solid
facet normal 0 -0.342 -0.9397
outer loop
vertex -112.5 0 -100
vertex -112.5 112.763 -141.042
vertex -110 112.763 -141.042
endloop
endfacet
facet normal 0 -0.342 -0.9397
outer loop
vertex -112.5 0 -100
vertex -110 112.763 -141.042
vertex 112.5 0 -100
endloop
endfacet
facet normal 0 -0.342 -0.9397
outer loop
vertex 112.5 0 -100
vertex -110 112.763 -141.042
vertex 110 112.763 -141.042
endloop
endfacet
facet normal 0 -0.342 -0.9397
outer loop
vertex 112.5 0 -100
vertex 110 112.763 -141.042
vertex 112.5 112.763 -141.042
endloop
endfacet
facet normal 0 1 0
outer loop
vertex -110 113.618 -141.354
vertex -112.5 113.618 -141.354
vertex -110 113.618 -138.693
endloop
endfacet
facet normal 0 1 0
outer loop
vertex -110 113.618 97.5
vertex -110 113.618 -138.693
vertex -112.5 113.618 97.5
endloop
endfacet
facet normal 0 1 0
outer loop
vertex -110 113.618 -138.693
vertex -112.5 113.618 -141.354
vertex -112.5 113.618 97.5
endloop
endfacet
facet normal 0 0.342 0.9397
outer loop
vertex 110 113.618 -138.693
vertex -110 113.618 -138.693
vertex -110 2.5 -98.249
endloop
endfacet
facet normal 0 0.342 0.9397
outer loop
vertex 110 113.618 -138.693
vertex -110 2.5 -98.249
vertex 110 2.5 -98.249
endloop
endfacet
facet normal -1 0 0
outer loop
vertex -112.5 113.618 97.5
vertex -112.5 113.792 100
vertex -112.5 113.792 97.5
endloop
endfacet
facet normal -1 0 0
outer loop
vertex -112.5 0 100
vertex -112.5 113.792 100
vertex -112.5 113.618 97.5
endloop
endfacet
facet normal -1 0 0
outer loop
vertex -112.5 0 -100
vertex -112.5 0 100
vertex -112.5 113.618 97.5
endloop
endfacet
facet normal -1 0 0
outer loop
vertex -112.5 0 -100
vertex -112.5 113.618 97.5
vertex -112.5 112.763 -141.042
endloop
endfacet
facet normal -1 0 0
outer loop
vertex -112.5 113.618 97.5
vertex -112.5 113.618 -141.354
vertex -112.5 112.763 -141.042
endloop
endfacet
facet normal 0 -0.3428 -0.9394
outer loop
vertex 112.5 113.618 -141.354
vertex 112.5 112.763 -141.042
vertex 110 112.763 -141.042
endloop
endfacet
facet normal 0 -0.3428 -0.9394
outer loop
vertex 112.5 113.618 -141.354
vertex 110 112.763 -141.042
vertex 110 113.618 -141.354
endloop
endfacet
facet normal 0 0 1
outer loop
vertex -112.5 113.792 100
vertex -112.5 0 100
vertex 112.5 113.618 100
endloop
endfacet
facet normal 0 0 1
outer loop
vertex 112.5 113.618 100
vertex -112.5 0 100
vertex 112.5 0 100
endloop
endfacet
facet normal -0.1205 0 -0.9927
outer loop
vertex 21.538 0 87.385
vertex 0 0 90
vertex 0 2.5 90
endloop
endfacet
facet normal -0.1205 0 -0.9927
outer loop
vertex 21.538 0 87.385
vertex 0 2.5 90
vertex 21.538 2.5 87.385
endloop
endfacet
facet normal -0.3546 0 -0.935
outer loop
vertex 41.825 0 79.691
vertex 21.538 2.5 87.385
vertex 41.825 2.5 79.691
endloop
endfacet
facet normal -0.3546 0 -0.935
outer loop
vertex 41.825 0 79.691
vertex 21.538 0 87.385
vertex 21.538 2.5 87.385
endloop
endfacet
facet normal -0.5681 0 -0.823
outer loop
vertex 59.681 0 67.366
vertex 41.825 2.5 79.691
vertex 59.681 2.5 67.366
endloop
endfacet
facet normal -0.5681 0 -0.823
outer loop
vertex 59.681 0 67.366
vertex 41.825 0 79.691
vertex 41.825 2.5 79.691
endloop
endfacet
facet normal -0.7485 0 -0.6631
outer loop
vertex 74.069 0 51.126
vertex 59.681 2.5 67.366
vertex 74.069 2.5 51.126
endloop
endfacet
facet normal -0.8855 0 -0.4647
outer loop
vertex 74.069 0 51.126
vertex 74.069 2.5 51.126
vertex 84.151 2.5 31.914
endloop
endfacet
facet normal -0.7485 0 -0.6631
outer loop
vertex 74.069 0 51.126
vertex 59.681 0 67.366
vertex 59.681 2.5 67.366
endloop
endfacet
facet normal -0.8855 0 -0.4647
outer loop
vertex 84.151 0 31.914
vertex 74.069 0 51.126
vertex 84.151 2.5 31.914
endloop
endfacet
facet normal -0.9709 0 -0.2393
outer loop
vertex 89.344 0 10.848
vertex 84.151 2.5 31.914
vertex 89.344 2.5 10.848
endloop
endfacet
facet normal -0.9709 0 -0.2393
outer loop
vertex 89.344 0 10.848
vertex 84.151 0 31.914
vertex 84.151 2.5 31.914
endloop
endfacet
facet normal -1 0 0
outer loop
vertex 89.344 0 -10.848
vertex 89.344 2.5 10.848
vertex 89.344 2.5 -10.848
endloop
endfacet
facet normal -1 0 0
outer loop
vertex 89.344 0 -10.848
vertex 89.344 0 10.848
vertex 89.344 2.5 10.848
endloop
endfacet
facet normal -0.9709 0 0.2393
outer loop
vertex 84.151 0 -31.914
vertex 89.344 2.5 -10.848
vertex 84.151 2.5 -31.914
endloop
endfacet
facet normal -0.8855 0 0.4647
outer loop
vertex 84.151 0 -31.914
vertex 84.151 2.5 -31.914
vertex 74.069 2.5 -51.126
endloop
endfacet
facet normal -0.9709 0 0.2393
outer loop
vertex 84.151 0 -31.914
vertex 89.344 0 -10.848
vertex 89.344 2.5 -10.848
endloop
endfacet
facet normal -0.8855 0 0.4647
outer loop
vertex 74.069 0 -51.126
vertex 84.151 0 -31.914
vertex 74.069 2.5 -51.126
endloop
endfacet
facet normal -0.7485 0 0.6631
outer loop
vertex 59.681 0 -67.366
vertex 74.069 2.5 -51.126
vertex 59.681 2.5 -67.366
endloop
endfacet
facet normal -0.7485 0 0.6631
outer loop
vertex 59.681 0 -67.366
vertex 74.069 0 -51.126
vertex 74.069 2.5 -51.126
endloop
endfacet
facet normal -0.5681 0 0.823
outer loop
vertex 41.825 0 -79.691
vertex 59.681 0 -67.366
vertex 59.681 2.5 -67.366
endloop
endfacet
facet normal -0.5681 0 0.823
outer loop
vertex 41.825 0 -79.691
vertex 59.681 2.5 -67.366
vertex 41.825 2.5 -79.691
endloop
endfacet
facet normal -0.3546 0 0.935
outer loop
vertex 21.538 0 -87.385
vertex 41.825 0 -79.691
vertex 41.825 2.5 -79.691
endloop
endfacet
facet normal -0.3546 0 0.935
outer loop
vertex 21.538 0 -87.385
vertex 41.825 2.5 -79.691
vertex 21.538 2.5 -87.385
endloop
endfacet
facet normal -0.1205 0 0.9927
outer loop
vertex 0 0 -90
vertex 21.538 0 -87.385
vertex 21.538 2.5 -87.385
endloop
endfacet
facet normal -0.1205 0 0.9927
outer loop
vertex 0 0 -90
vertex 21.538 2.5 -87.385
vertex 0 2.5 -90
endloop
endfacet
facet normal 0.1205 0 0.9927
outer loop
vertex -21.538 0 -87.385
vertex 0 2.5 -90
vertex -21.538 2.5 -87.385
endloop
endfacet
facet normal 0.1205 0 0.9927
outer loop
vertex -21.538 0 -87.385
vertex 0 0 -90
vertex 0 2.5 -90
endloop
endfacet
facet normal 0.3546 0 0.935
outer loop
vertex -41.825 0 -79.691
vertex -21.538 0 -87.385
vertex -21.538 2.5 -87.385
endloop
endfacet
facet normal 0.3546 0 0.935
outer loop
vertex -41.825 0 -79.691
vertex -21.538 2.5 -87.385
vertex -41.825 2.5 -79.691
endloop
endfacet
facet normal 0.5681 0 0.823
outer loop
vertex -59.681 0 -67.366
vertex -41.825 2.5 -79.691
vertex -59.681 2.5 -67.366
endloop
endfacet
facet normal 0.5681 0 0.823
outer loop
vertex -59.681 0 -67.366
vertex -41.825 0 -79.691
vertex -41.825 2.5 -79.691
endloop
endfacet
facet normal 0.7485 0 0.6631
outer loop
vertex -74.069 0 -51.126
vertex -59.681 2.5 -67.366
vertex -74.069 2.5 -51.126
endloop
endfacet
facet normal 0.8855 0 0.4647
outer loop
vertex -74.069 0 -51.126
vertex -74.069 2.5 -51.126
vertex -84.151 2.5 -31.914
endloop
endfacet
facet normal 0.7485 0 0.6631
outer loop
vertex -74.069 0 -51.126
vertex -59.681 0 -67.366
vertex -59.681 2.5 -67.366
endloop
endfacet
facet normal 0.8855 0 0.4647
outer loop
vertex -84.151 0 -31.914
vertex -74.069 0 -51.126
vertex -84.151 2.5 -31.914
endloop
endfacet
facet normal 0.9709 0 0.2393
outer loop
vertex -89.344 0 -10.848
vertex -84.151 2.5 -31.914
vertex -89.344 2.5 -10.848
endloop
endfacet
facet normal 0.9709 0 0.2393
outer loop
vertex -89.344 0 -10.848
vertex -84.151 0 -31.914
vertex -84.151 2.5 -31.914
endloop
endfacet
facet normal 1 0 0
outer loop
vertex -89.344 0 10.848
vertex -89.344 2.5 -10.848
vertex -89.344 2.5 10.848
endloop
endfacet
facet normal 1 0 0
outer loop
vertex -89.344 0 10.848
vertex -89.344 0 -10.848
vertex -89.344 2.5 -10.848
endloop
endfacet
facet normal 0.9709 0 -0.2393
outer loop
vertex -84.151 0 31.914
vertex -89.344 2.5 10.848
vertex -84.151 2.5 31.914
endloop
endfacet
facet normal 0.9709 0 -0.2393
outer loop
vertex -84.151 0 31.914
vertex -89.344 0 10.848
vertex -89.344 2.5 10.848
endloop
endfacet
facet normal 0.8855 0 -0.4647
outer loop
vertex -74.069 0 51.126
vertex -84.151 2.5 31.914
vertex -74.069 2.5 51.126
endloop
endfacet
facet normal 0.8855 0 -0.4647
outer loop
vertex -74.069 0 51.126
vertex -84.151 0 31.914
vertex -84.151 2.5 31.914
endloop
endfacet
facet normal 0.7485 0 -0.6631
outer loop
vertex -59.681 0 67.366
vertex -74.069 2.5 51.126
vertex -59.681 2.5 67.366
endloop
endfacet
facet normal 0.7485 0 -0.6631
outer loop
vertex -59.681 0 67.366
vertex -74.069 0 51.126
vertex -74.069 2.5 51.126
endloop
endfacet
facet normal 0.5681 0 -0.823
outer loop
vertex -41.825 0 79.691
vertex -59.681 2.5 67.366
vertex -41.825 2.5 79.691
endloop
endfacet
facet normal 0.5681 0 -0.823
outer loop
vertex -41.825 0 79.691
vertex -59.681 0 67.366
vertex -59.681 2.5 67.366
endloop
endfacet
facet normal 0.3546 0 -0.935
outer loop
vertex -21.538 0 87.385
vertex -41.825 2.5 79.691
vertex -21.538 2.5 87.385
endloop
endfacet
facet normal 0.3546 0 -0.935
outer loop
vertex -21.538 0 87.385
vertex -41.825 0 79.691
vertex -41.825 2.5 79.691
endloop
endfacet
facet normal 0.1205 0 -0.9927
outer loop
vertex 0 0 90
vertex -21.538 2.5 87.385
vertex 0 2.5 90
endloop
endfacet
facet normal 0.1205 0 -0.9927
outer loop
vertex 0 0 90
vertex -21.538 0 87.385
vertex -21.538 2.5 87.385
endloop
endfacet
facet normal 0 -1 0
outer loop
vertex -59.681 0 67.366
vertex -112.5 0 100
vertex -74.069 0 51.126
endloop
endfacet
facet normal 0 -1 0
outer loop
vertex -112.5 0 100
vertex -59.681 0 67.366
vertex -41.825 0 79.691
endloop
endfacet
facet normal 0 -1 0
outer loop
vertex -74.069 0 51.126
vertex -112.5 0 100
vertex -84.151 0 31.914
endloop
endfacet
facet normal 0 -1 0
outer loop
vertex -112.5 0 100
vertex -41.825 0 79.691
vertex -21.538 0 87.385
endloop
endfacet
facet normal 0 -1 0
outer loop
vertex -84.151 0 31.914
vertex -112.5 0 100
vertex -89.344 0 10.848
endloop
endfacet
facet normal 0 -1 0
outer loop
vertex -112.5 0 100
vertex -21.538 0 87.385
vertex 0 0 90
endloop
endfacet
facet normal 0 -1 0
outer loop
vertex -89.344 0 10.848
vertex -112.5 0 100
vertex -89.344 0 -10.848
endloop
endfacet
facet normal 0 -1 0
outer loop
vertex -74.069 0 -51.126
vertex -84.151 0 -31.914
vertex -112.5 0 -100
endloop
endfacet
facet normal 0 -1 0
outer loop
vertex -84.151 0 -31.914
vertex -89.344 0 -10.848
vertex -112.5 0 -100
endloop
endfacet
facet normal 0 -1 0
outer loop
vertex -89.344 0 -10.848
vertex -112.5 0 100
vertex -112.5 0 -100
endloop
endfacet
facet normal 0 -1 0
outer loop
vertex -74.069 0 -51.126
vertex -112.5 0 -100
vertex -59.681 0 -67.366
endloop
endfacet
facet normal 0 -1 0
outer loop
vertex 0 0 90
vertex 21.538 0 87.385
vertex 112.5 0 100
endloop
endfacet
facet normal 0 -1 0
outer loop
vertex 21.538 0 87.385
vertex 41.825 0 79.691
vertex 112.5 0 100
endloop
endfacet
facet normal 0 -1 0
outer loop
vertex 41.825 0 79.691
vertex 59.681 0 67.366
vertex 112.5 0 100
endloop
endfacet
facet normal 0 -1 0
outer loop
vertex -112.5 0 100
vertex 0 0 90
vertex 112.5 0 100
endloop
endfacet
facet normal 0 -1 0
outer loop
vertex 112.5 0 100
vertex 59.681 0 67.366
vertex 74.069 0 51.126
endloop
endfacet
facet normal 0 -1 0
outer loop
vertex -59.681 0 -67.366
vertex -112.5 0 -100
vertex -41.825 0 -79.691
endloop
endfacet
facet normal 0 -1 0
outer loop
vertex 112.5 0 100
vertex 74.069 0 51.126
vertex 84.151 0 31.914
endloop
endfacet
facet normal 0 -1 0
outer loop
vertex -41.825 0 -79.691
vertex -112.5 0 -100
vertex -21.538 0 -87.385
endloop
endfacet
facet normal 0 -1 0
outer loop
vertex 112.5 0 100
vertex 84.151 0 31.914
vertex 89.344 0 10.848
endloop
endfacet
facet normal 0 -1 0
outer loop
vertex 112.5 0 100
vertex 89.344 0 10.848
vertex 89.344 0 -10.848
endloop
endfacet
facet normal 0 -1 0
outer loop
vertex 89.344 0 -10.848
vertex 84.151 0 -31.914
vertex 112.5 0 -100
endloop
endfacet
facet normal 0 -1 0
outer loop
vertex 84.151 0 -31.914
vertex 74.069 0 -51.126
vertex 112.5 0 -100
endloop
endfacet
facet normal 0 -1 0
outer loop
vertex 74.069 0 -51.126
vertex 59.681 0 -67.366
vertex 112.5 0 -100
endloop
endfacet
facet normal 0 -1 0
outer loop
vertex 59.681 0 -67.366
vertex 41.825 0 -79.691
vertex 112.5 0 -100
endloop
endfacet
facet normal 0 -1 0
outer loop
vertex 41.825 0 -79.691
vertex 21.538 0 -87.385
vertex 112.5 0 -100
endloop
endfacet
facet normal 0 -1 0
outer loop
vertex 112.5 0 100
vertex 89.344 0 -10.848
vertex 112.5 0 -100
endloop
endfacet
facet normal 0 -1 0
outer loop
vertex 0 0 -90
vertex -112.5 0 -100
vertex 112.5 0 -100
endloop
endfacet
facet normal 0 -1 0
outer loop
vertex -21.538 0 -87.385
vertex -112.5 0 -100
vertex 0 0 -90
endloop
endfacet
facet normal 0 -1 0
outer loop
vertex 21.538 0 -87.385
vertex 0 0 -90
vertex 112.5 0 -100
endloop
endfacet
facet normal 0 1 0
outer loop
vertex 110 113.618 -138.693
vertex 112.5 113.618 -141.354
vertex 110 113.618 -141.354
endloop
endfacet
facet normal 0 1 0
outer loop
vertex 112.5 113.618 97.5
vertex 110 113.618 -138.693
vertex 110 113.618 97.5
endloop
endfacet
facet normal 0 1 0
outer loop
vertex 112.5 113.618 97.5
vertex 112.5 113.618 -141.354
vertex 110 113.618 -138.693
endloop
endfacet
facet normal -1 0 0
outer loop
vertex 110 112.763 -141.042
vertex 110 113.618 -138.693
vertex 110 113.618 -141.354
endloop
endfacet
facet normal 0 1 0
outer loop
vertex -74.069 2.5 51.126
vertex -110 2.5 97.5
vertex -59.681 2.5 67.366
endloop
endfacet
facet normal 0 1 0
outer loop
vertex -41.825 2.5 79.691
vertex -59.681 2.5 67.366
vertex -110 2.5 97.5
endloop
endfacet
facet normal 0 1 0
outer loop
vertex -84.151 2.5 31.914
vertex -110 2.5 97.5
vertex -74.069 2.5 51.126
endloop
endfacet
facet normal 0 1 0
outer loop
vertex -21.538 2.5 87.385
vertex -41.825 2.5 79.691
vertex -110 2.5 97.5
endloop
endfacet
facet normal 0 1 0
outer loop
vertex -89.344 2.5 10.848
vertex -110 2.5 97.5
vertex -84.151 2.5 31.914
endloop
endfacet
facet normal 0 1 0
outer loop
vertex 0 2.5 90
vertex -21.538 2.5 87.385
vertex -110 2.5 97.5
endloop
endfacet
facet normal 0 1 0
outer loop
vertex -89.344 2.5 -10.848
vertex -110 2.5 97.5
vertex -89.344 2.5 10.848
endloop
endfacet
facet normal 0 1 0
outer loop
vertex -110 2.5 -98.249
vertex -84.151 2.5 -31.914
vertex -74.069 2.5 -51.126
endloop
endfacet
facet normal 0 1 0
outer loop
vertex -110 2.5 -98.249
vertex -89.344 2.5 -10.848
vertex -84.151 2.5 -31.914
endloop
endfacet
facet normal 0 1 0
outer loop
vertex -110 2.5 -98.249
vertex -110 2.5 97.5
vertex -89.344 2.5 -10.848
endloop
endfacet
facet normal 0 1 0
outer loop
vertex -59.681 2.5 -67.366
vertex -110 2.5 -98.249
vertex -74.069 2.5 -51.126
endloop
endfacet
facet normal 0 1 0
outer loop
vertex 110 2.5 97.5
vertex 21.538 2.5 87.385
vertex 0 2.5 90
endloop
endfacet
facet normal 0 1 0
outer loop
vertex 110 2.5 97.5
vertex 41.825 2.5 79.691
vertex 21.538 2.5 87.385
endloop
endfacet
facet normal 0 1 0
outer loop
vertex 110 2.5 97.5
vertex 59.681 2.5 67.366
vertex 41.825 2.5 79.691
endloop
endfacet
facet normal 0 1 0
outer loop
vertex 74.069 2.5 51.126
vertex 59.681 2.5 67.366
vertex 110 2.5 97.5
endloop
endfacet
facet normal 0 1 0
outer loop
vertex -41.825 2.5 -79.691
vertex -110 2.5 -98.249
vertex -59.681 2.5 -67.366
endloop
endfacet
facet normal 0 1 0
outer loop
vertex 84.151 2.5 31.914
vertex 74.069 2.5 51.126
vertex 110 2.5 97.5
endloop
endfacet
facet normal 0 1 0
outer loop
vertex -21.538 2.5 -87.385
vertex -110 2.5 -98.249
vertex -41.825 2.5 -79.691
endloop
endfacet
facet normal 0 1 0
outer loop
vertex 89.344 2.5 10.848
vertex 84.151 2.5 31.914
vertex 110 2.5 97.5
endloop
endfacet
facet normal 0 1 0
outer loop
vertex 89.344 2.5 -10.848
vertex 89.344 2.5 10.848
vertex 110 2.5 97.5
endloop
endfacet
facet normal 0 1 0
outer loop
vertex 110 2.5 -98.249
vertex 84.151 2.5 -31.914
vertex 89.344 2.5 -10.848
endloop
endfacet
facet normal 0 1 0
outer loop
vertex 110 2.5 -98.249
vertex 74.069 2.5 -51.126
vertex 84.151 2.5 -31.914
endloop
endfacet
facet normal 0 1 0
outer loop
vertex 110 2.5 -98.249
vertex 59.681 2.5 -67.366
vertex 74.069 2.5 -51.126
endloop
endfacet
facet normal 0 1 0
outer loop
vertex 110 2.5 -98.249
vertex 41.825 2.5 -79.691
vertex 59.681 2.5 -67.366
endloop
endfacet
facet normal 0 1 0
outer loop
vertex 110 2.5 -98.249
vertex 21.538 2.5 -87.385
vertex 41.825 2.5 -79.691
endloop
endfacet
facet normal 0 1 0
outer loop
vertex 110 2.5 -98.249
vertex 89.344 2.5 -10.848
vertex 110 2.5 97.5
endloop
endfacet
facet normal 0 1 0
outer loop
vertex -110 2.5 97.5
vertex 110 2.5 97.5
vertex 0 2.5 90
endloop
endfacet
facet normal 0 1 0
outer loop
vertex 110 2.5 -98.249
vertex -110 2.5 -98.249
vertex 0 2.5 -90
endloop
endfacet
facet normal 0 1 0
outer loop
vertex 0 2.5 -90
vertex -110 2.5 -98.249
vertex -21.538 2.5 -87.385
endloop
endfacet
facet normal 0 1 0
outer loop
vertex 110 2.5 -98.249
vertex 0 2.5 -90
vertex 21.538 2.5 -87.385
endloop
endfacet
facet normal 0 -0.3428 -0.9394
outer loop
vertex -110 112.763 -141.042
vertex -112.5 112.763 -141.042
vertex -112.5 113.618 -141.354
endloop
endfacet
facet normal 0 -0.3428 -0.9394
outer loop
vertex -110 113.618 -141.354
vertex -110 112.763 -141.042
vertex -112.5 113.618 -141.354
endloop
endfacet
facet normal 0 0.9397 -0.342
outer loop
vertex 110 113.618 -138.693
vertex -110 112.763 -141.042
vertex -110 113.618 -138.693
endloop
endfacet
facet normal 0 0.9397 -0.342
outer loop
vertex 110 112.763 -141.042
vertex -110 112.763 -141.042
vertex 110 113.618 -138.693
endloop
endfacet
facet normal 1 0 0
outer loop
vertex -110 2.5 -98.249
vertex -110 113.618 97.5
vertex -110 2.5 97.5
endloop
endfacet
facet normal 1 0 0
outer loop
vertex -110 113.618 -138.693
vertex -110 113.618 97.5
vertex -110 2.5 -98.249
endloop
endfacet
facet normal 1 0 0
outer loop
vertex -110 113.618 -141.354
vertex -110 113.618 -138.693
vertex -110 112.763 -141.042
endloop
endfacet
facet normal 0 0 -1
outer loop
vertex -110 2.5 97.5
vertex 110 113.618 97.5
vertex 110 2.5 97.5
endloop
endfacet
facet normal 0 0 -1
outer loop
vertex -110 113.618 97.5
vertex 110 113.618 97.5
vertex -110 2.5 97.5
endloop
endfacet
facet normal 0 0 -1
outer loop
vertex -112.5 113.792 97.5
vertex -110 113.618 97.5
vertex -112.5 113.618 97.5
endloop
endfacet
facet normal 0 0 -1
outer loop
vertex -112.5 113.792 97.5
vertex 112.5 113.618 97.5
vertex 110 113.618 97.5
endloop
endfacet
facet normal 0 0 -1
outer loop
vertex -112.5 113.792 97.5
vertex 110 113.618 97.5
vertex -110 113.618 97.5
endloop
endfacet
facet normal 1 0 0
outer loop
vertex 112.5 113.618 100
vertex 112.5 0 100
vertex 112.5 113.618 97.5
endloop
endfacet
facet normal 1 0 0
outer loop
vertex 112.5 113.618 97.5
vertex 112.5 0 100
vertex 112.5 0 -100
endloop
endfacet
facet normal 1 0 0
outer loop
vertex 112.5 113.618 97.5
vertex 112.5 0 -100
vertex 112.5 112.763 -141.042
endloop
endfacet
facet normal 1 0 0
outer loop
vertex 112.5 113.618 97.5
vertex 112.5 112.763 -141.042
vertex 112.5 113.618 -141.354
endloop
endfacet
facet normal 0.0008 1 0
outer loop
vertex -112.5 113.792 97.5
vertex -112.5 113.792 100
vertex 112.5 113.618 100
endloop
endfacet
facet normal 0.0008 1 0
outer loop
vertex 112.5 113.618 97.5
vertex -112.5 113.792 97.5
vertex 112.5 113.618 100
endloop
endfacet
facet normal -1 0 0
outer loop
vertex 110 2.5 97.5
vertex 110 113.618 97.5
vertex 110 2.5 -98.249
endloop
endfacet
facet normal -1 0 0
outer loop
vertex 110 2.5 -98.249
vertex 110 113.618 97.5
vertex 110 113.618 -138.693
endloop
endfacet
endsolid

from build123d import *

# Parameters (mm, degrees)
SKETCH_1_W       = 225
SKETCH_1_H       = 200
SKETCH_1_R       = 90
EXTRUDE_1_DEPTH  = 2.5
SKETCH_9_W       = 225
SKETCH_9_H       = 120
EXTRUDE_11_DEPTH = 2.5
EXTRUDE_12_DEPTH = 2.5
EXTRUDE_13_DEPTH = 2.5
EXTRUDE_14_DEPTH = 2.5


with BuildPart() as part:
    # 草图1 → 凸台-拉伸1 (new body)
    with BuildSketch(Plane(origin=(0, 0, 0), x_dir=(1, 0, 0), z_dir=(0, 1, 0))):
        Rectangle(SKETCH_1_W, SKETCH_1_H)
        with Locations(Location((0, 0, 0), (0, 0, 270))):
            Circle(SKETCH_1_R, mode=Mode.SUBTRACT)
    extrude(amount=EXTRUDE_1_DEPTH)

    # 草图9 → 凸台-拉伸11 (add)
    with BuildSketch(Plane(origin=(0, -32.139380484, -88.302222156), x_dir=(1, 0, 0), z_dir=(0, 0.3420201433256658, 0.9396926207859095))):
        with Locations((0, 94.202014333)):
            Rectangle(SKETCH_9_W, SKETCH_9_H)
    extrude(amount=EXTRUDE_11_DEPTH)

    # 草图12 → 凸台-拉伸12 (add)
    with BuildSketch(Plane.ZY.offset(112.5)):
        Polygon((-100, 0), (-141.353630078, 113.618164853), (100, 113.618164853), (100, 0), align=None)
    extrude(amount=-EXTRUDE_12_DEPTH)

    # 草图13 → 凸台-拉伸13 (add)
    with BuildSketch(Plane(origin=(112.5, 0, 0), x_dir=(0, 0, -1), z_dir=(1, 0, 0))):
        Polygon((100, 0), (141.353630078, 113.618164853), (-100, 113.618164853), (-100, 0), align=None)
    extrude(amount=-EXTRUDE_13_DEPTH)

    # 草图15 → 凸台-拉伸14 (add)
    with BuildSketch(Plane.XY.offset(100)):
        Polygon((-112.5, 0), (-112.5, 113.791515023), (112.5, 113.618164853), (112.5, 0), align=None)
    extrude(amount=-EXTRUDE_14_DEPTH)


solid = part.part
